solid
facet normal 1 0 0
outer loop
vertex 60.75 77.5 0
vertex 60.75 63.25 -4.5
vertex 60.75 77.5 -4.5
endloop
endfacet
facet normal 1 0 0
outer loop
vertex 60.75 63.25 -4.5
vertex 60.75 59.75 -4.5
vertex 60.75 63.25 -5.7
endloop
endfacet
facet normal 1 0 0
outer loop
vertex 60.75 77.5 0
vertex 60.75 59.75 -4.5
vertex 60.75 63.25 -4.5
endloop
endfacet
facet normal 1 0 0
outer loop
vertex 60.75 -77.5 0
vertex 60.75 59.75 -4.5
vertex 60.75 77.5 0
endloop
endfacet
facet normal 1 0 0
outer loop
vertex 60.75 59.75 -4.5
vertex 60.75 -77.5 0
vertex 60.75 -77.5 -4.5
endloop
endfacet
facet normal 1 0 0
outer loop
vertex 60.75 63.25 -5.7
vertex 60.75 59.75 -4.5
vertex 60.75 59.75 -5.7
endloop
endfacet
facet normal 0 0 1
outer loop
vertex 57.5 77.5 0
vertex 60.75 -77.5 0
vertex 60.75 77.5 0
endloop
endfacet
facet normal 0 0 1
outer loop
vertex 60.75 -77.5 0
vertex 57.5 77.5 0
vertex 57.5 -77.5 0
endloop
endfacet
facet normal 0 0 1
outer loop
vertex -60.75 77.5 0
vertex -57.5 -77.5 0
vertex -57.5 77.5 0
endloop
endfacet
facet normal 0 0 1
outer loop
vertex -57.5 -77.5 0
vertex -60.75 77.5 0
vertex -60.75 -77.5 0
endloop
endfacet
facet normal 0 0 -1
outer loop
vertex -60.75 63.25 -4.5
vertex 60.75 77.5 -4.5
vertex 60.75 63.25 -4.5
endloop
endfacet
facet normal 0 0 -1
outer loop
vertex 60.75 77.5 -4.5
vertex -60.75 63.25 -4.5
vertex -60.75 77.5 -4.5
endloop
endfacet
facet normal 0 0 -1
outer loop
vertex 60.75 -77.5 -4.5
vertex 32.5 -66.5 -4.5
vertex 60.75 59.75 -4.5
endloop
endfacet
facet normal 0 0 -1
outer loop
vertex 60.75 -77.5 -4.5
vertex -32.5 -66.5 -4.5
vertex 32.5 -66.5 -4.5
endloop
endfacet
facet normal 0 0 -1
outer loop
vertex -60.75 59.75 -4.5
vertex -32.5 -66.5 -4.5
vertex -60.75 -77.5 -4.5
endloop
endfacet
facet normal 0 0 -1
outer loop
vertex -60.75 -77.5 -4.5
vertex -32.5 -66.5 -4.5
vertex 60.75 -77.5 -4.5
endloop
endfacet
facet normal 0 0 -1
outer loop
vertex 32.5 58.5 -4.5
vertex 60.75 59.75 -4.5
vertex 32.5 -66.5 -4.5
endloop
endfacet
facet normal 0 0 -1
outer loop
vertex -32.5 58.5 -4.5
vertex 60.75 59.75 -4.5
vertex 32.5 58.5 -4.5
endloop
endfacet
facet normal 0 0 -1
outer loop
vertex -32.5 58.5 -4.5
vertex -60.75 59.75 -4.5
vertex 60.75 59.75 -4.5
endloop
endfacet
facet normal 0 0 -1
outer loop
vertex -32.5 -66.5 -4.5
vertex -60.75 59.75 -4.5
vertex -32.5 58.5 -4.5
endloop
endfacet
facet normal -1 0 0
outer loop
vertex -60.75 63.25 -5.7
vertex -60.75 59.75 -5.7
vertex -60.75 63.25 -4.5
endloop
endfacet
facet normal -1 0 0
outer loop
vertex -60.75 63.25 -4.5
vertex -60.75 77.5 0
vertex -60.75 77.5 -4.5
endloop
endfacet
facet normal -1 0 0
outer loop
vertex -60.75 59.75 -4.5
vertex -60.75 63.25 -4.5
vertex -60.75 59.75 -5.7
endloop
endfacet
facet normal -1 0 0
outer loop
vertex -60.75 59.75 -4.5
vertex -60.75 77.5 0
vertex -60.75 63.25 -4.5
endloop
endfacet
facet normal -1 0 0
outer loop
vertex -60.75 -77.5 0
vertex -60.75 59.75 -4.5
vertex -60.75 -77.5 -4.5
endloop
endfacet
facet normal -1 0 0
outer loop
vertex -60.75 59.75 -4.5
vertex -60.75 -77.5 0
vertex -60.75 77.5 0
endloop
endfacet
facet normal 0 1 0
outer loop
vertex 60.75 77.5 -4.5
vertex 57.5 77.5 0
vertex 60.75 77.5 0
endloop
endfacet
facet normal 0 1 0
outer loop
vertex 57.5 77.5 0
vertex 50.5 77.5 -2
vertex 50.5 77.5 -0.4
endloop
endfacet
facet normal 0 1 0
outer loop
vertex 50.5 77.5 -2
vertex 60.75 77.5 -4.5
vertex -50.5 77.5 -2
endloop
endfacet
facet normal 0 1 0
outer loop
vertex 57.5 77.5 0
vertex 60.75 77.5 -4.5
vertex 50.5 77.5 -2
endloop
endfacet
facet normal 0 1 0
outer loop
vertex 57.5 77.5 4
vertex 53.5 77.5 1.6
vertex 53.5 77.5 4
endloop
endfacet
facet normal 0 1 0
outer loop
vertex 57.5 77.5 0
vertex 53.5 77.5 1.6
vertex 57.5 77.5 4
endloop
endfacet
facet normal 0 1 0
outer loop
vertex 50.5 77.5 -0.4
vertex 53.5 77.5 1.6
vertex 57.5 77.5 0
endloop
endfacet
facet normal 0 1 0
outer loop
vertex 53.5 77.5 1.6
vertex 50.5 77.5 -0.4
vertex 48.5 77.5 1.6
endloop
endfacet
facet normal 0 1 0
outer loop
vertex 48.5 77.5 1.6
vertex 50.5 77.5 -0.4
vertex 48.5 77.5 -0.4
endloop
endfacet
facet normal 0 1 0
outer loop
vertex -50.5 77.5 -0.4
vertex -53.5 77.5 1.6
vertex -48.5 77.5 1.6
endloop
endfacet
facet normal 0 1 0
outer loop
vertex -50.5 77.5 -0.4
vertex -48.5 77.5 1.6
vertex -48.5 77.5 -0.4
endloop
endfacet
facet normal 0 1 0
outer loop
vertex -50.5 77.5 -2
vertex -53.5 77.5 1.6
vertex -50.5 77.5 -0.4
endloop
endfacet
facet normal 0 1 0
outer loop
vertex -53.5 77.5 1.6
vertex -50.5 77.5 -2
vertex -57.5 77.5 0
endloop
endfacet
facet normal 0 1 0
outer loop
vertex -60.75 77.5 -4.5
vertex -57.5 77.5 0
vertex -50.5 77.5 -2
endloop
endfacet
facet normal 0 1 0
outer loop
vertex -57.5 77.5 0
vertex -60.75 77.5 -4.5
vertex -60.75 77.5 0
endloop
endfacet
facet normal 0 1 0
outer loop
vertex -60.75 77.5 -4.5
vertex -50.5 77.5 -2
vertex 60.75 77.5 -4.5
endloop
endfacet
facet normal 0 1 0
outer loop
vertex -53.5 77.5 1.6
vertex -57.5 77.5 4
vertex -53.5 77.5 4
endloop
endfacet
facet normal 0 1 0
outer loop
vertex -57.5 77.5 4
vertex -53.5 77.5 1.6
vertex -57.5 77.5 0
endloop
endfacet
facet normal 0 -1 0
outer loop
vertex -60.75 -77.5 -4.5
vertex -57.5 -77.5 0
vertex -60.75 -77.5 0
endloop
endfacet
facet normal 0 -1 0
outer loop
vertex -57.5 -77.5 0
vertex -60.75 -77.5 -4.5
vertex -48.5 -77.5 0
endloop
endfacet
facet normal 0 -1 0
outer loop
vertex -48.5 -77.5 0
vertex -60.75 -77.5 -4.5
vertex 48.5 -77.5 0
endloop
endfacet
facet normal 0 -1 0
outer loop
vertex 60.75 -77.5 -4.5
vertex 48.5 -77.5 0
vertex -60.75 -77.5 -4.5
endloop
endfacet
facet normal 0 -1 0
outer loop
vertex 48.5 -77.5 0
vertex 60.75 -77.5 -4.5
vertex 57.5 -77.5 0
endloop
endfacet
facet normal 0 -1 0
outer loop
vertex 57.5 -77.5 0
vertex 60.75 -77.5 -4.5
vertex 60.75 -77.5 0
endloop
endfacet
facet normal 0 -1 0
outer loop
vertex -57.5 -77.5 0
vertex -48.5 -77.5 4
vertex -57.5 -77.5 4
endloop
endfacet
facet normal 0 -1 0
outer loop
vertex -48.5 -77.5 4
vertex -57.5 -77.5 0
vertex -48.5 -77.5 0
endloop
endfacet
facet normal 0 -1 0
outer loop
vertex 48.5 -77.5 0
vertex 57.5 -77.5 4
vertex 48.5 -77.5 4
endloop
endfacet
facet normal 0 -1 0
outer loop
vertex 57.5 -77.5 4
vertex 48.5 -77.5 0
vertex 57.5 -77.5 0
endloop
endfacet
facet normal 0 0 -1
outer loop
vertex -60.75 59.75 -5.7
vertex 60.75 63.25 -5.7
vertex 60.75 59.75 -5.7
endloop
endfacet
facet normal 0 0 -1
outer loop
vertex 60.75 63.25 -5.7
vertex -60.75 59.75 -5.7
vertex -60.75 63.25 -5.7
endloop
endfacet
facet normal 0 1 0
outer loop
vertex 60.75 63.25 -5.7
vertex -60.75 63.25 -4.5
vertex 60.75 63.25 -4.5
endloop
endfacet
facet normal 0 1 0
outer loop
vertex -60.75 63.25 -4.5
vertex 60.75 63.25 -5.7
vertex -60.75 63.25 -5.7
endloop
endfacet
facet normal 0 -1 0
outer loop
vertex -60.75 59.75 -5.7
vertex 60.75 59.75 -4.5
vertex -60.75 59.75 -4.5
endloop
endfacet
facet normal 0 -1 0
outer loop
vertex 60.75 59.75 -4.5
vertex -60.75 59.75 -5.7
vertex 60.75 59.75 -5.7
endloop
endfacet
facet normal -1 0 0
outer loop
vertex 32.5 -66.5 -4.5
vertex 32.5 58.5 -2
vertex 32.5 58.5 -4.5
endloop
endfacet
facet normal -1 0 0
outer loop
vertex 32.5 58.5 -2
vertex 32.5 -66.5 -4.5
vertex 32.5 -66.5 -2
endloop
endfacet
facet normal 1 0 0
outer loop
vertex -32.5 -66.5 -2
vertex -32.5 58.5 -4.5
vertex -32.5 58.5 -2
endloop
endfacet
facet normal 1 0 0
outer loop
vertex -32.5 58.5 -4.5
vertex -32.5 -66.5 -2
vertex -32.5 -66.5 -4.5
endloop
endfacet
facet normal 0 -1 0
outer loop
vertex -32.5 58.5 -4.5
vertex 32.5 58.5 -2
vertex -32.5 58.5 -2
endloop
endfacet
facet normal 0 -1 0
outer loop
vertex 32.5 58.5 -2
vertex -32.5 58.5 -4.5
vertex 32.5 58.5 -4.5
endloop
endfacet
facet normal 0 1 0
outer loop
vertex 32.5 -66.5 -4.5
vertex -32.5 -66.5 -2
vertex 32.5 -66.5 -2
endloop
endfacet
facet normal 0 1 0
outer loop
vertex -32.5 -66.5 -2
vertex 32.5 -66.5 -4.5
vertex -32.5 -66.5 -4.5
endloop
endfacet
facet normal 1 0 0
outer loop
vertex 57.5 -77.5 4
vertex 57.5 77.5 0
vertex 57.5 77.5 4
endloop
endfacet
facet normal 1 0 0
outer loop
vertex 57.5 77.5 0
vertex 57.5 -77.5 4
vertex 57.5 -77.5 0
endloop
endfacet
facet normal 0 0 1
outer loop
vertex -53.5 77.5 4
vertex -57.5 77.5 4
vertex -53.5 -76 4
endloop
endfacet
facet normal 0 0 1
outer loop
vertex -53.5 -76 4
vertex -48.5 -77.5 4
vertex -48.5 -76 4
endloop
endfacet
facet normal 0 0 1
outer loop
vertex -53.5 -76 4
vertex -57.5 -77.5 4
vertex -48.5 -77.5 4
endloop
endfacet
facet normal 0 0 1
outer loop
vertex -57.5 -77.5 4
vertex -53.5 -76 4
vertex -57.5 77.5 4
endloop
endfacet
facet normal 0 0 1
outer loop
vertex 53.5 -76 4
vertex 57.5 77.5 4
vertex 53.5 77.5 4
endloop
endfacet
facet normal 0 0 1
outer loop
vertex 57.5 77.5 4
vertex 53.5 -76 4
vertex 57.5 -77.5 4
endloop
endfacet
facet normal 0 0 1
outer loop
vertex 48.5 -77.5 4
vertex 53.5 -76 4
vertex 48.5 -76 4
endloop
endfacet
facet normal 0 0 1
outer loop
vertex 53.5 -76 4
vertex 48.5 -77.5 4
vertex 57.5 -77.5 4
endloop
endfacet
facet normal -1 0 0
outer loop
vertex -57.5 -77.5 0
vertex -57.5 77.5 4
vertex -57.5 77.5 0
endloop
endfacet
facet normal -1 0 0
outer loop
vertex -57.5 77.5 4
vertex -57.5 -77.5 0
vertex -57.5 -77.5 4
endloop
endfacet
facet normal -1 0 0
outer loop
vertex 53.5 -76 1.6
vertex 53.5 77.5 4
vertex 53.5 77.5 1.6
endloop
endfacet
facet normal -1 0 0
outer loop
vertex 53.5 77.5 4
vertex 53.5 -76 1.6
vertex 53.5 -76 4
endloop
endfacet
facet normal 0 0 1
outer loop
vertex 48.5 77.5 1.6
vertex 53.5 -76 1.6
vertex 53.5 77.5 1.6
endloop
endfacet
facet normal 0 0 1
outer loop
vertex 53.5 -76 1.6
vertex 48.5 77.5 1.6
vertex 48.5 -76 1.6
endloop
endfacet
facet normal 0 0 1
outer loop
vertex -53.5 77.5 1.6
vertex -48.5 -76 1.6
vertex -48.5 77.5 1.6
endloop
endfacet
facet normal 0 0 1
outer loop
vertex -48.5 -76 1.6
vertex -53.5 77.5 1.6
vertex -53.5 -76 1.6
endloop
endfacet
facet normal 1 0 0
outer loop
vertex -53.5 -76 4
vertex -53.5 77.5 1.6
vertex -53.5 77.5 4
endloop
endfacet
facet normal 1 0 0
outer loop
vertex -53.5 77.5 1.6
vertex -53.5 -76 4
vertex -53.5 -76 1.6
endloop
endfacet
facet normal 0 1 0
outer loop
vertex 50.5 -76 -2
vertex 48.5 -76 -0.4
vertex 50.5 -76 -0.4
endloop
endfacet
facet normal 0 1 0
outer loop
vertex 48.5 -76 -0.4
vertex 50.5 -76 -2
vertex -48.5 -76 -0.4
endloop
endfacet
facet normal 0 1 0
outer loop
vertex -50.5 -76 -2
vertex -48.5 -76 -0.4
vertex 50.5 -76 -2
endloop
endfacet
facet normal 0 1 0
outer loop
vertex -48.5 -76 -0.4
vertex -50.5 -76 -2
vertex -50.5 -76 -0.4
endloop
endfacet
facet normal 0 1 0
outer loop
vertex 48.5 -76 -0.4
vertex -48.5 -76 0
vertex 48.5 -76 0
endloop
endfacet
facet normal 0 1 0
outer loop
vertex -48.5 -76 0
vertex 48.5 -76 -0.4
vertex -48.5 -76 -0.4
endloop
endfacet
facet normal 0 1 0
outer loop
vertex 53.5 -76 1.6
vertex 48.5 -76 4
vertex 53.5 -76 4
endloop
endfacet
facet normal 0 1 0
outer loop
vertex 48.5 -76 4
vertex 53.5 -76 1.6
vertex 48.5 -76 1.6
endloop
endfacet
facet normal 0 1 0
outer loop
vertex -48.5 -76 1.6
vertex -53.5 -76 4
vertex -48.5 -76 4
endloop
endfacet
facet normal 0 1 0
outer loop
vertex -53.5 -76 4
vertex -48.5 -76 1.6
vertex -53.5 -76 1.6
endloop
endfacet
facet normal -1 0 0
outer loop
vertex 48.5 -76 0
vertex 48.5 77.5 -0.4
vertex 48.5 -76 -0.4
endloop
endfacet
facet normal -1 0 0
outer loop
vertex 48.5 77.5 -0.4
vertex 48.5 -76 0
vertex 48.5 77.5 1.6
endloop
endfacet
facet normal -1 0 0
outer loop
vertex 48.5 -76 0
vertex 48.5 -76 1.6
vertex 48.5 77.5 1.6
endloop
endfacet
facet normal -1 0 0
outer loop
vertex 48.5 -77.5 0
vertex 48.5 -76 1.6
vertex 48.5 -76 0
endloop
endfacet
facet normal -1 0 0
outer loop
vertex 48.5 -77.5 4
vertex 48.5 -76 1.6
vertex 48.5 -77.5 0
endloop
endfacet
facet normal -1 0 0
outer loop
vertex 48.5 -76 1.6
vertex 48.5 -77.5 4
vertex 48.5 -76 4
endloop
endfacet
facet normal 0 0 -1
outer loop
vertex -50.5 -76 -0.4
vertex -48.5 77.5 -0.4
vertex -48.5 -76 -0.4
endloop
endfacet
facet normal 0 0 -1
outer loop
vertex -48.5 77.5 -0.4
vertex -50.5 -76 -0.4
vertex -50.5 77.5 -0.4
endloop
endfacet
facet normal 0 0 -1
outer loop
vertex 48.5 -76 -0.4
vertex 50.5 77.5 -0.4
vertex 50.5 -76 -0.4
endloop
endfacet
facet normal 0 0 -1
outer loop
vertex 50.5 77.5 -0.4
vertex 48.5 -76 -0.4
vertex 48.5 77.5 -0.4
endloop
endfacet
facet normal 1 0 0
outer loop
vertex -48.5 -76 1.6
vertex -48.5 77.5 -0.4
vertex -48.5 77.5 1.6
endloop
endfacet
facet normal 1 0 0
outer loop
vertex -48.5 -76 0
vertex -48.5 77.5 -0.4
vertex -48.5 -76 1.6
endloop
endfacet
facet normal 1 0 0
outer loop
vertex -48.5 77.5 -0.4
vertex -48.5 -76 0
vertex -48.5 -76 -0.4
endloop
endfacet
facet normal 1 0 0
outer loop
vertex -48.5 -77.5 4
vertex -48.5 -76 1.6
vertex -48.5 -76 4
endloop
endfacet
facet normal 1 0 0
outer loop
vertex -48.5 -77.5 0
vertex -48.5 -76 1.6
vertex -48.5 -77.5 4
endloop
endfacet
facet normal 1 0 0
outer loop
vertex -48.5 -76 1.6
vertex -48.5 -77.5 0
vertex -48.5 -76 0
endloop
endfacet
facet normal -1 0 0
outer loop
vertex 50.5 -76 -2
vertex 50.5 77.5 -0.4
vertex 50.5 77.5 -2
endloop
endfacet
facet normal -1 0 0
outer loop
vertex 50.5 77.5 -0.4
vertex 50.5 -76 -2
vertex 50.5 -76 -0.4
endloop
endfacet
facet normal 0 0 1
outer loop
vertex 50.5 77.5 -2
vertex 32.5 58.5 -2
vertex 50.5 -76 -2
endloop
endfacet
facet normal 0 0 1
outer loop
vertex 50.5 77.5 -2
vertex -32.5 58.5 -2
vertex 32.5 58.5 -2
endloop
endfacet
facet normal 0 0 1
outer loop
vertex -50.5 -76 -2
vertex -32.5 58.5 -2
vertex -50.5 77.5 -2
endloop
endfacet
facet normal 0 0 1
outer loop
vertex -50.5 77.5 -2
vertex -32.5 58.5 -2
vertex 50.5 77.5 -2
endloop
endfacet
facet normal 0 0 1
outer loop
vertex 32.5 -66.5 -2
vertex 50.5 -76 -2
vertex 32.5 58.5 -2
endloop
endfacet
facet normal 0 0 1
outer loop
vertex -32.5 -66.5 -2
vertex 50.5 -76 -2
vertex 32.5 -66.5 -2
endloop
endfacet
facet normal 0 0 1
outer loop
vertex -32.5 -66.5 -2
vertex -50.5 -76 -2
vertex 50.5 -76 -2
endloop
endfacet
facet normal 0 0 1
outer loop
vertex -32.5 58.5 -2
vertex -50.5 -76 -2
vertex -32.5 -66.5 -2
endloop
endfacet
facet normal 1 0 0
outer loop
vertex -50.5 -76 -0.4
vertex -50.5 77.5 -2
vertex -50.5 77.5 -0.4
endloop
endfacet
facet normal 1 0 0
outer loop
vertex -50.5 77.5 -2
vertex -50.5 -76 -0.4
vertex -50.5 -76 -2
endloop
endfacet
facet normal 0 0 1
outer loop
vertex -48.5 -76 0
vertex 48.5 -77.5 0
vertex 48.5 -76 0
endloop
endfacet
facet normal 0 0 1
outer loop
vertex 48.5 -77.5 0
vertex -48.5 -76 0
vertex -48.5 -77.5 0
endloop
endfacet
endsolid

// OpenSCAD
frame_width = 65;
frame_depth = 125;
frame_center_x = 0;
frame_center_y = 0;

ground_glass_offset = 13;

graflock_plate_height = 4.5;
film_thikness = 0.1;

film_base_offset_z = -2;

ground_glass_thikness = 3;

module graflock_plate() {
    width = 121.5;
    depth = 155;
    height = graflock_plate_height;
    frame_center_y = -(depth - frame_depth)/2+11;
    difference() {
        union() {
            translate([0, 0,-height/2])
                cube([width, depth, height], center=true);
            translate([0, (139 - depth/2) , -height - 1.2/2])
                cube([width, 3.5, 1.2], center=true);
        }
        translate([0, frame_center_y,-height/2])
            cube([frame_width, frame_depth, height], center = true);
    }
}

module film_container_slider() {
    width1 = 107;
    depth1 = 155-1;
    height1 = 8.7;
    //height1 = 7;

    width2 = 97;
    depth2 = 155-1;
    height2 = 2;

    width3 = 101;
    depth3 = 155-1;
    height3 = 1.6;
        
    
    union() {
        translate([0, 0, height1/2 + height2 + height3])
            cube([width1, depth1, height1], center=true);
        translate([0, 0, height2/2 + height3])
            cube([width2, depth2, height2], center=true);
        translate([0, 0, height3/2])
            cube([width3, depth3, height3], center=true);
    }
}

module base() {
    h = 6;
    offset_h = -film_base_offset_z;
    difference() {
        union() {
            graflock_plate();
            translate([0, 0,h/2-offset_h/2])
                cube([115, 155, h-offset_h], center = true);
        }
        translate([0, 1, -offset_h])
            //scale([1.01, 1, 1])
                film_container_slider();
        translate([0, -1,h/2])
                cube([97, 155, h], center = true);
    }
}

module ground_glass() {
    height = ground_glass_thikness;
    translate([0, frame_center_y, ground_glass_offset - graflock_plate_height + height/2 + film_thikness - film_base_offset_z])
            cube([frame_width+5, frame_depth+5, height], center = true);

}

module nut() {
    $fn = 50;
    union() {
        cylinder(h= 10, d =2);
        translate([0, 0, 10-2])
            cylinder(h=2, r1=1, r2=2.5);
    }
}
module ground_glass_container() {
    h = 3+13;
    difference() {
        union() {
            film_container_slider();
            translate([0, 0,h/2])
                cube([90, 154, h], center = true);
        }
        ground_glass();
        translate([0, frame_center_y,h/2])
            cube([frame_width, frame_depth, h], center = true);
        translate([40, -50, 6])
            nut();
        translate([40,   0, 6])
            nut();
        translate([40,  50, 6])
            nut();
        translate([-40, -50, 6])
            nut();
        translate([-40,   0, 6])
            nut();
        translate([-40,  50, 6])
            nut();
    }
}

module ground_glass_container_bottom() {
    split_h = ground_glass_offset - graflock_plate_height + ground_glass_thikness - film_thikness - film_base_offset_z;
    intersection() {
        ground_glass_container();
        translate([0,0,split_h/2])
            cube([160, 160 ,split_h], center=true);
    }
}

module ground_glass_container_upper() {
    split_h = ground_glass_offset - graflock_plate_height + ground_glass_thikness - film_thikness - film_base_offset_z;
    intersection() {
        ground_glass_container();
        translate([0,0,split_h/2+split_h])
            cube([160, 160 ,split_h], center=true);
    }
}
//graflock_plate();
//film_container_slider();

base();
//ground_glass_container();
//ground_glass_container_bottom();
//ground_glass_container_upper();
